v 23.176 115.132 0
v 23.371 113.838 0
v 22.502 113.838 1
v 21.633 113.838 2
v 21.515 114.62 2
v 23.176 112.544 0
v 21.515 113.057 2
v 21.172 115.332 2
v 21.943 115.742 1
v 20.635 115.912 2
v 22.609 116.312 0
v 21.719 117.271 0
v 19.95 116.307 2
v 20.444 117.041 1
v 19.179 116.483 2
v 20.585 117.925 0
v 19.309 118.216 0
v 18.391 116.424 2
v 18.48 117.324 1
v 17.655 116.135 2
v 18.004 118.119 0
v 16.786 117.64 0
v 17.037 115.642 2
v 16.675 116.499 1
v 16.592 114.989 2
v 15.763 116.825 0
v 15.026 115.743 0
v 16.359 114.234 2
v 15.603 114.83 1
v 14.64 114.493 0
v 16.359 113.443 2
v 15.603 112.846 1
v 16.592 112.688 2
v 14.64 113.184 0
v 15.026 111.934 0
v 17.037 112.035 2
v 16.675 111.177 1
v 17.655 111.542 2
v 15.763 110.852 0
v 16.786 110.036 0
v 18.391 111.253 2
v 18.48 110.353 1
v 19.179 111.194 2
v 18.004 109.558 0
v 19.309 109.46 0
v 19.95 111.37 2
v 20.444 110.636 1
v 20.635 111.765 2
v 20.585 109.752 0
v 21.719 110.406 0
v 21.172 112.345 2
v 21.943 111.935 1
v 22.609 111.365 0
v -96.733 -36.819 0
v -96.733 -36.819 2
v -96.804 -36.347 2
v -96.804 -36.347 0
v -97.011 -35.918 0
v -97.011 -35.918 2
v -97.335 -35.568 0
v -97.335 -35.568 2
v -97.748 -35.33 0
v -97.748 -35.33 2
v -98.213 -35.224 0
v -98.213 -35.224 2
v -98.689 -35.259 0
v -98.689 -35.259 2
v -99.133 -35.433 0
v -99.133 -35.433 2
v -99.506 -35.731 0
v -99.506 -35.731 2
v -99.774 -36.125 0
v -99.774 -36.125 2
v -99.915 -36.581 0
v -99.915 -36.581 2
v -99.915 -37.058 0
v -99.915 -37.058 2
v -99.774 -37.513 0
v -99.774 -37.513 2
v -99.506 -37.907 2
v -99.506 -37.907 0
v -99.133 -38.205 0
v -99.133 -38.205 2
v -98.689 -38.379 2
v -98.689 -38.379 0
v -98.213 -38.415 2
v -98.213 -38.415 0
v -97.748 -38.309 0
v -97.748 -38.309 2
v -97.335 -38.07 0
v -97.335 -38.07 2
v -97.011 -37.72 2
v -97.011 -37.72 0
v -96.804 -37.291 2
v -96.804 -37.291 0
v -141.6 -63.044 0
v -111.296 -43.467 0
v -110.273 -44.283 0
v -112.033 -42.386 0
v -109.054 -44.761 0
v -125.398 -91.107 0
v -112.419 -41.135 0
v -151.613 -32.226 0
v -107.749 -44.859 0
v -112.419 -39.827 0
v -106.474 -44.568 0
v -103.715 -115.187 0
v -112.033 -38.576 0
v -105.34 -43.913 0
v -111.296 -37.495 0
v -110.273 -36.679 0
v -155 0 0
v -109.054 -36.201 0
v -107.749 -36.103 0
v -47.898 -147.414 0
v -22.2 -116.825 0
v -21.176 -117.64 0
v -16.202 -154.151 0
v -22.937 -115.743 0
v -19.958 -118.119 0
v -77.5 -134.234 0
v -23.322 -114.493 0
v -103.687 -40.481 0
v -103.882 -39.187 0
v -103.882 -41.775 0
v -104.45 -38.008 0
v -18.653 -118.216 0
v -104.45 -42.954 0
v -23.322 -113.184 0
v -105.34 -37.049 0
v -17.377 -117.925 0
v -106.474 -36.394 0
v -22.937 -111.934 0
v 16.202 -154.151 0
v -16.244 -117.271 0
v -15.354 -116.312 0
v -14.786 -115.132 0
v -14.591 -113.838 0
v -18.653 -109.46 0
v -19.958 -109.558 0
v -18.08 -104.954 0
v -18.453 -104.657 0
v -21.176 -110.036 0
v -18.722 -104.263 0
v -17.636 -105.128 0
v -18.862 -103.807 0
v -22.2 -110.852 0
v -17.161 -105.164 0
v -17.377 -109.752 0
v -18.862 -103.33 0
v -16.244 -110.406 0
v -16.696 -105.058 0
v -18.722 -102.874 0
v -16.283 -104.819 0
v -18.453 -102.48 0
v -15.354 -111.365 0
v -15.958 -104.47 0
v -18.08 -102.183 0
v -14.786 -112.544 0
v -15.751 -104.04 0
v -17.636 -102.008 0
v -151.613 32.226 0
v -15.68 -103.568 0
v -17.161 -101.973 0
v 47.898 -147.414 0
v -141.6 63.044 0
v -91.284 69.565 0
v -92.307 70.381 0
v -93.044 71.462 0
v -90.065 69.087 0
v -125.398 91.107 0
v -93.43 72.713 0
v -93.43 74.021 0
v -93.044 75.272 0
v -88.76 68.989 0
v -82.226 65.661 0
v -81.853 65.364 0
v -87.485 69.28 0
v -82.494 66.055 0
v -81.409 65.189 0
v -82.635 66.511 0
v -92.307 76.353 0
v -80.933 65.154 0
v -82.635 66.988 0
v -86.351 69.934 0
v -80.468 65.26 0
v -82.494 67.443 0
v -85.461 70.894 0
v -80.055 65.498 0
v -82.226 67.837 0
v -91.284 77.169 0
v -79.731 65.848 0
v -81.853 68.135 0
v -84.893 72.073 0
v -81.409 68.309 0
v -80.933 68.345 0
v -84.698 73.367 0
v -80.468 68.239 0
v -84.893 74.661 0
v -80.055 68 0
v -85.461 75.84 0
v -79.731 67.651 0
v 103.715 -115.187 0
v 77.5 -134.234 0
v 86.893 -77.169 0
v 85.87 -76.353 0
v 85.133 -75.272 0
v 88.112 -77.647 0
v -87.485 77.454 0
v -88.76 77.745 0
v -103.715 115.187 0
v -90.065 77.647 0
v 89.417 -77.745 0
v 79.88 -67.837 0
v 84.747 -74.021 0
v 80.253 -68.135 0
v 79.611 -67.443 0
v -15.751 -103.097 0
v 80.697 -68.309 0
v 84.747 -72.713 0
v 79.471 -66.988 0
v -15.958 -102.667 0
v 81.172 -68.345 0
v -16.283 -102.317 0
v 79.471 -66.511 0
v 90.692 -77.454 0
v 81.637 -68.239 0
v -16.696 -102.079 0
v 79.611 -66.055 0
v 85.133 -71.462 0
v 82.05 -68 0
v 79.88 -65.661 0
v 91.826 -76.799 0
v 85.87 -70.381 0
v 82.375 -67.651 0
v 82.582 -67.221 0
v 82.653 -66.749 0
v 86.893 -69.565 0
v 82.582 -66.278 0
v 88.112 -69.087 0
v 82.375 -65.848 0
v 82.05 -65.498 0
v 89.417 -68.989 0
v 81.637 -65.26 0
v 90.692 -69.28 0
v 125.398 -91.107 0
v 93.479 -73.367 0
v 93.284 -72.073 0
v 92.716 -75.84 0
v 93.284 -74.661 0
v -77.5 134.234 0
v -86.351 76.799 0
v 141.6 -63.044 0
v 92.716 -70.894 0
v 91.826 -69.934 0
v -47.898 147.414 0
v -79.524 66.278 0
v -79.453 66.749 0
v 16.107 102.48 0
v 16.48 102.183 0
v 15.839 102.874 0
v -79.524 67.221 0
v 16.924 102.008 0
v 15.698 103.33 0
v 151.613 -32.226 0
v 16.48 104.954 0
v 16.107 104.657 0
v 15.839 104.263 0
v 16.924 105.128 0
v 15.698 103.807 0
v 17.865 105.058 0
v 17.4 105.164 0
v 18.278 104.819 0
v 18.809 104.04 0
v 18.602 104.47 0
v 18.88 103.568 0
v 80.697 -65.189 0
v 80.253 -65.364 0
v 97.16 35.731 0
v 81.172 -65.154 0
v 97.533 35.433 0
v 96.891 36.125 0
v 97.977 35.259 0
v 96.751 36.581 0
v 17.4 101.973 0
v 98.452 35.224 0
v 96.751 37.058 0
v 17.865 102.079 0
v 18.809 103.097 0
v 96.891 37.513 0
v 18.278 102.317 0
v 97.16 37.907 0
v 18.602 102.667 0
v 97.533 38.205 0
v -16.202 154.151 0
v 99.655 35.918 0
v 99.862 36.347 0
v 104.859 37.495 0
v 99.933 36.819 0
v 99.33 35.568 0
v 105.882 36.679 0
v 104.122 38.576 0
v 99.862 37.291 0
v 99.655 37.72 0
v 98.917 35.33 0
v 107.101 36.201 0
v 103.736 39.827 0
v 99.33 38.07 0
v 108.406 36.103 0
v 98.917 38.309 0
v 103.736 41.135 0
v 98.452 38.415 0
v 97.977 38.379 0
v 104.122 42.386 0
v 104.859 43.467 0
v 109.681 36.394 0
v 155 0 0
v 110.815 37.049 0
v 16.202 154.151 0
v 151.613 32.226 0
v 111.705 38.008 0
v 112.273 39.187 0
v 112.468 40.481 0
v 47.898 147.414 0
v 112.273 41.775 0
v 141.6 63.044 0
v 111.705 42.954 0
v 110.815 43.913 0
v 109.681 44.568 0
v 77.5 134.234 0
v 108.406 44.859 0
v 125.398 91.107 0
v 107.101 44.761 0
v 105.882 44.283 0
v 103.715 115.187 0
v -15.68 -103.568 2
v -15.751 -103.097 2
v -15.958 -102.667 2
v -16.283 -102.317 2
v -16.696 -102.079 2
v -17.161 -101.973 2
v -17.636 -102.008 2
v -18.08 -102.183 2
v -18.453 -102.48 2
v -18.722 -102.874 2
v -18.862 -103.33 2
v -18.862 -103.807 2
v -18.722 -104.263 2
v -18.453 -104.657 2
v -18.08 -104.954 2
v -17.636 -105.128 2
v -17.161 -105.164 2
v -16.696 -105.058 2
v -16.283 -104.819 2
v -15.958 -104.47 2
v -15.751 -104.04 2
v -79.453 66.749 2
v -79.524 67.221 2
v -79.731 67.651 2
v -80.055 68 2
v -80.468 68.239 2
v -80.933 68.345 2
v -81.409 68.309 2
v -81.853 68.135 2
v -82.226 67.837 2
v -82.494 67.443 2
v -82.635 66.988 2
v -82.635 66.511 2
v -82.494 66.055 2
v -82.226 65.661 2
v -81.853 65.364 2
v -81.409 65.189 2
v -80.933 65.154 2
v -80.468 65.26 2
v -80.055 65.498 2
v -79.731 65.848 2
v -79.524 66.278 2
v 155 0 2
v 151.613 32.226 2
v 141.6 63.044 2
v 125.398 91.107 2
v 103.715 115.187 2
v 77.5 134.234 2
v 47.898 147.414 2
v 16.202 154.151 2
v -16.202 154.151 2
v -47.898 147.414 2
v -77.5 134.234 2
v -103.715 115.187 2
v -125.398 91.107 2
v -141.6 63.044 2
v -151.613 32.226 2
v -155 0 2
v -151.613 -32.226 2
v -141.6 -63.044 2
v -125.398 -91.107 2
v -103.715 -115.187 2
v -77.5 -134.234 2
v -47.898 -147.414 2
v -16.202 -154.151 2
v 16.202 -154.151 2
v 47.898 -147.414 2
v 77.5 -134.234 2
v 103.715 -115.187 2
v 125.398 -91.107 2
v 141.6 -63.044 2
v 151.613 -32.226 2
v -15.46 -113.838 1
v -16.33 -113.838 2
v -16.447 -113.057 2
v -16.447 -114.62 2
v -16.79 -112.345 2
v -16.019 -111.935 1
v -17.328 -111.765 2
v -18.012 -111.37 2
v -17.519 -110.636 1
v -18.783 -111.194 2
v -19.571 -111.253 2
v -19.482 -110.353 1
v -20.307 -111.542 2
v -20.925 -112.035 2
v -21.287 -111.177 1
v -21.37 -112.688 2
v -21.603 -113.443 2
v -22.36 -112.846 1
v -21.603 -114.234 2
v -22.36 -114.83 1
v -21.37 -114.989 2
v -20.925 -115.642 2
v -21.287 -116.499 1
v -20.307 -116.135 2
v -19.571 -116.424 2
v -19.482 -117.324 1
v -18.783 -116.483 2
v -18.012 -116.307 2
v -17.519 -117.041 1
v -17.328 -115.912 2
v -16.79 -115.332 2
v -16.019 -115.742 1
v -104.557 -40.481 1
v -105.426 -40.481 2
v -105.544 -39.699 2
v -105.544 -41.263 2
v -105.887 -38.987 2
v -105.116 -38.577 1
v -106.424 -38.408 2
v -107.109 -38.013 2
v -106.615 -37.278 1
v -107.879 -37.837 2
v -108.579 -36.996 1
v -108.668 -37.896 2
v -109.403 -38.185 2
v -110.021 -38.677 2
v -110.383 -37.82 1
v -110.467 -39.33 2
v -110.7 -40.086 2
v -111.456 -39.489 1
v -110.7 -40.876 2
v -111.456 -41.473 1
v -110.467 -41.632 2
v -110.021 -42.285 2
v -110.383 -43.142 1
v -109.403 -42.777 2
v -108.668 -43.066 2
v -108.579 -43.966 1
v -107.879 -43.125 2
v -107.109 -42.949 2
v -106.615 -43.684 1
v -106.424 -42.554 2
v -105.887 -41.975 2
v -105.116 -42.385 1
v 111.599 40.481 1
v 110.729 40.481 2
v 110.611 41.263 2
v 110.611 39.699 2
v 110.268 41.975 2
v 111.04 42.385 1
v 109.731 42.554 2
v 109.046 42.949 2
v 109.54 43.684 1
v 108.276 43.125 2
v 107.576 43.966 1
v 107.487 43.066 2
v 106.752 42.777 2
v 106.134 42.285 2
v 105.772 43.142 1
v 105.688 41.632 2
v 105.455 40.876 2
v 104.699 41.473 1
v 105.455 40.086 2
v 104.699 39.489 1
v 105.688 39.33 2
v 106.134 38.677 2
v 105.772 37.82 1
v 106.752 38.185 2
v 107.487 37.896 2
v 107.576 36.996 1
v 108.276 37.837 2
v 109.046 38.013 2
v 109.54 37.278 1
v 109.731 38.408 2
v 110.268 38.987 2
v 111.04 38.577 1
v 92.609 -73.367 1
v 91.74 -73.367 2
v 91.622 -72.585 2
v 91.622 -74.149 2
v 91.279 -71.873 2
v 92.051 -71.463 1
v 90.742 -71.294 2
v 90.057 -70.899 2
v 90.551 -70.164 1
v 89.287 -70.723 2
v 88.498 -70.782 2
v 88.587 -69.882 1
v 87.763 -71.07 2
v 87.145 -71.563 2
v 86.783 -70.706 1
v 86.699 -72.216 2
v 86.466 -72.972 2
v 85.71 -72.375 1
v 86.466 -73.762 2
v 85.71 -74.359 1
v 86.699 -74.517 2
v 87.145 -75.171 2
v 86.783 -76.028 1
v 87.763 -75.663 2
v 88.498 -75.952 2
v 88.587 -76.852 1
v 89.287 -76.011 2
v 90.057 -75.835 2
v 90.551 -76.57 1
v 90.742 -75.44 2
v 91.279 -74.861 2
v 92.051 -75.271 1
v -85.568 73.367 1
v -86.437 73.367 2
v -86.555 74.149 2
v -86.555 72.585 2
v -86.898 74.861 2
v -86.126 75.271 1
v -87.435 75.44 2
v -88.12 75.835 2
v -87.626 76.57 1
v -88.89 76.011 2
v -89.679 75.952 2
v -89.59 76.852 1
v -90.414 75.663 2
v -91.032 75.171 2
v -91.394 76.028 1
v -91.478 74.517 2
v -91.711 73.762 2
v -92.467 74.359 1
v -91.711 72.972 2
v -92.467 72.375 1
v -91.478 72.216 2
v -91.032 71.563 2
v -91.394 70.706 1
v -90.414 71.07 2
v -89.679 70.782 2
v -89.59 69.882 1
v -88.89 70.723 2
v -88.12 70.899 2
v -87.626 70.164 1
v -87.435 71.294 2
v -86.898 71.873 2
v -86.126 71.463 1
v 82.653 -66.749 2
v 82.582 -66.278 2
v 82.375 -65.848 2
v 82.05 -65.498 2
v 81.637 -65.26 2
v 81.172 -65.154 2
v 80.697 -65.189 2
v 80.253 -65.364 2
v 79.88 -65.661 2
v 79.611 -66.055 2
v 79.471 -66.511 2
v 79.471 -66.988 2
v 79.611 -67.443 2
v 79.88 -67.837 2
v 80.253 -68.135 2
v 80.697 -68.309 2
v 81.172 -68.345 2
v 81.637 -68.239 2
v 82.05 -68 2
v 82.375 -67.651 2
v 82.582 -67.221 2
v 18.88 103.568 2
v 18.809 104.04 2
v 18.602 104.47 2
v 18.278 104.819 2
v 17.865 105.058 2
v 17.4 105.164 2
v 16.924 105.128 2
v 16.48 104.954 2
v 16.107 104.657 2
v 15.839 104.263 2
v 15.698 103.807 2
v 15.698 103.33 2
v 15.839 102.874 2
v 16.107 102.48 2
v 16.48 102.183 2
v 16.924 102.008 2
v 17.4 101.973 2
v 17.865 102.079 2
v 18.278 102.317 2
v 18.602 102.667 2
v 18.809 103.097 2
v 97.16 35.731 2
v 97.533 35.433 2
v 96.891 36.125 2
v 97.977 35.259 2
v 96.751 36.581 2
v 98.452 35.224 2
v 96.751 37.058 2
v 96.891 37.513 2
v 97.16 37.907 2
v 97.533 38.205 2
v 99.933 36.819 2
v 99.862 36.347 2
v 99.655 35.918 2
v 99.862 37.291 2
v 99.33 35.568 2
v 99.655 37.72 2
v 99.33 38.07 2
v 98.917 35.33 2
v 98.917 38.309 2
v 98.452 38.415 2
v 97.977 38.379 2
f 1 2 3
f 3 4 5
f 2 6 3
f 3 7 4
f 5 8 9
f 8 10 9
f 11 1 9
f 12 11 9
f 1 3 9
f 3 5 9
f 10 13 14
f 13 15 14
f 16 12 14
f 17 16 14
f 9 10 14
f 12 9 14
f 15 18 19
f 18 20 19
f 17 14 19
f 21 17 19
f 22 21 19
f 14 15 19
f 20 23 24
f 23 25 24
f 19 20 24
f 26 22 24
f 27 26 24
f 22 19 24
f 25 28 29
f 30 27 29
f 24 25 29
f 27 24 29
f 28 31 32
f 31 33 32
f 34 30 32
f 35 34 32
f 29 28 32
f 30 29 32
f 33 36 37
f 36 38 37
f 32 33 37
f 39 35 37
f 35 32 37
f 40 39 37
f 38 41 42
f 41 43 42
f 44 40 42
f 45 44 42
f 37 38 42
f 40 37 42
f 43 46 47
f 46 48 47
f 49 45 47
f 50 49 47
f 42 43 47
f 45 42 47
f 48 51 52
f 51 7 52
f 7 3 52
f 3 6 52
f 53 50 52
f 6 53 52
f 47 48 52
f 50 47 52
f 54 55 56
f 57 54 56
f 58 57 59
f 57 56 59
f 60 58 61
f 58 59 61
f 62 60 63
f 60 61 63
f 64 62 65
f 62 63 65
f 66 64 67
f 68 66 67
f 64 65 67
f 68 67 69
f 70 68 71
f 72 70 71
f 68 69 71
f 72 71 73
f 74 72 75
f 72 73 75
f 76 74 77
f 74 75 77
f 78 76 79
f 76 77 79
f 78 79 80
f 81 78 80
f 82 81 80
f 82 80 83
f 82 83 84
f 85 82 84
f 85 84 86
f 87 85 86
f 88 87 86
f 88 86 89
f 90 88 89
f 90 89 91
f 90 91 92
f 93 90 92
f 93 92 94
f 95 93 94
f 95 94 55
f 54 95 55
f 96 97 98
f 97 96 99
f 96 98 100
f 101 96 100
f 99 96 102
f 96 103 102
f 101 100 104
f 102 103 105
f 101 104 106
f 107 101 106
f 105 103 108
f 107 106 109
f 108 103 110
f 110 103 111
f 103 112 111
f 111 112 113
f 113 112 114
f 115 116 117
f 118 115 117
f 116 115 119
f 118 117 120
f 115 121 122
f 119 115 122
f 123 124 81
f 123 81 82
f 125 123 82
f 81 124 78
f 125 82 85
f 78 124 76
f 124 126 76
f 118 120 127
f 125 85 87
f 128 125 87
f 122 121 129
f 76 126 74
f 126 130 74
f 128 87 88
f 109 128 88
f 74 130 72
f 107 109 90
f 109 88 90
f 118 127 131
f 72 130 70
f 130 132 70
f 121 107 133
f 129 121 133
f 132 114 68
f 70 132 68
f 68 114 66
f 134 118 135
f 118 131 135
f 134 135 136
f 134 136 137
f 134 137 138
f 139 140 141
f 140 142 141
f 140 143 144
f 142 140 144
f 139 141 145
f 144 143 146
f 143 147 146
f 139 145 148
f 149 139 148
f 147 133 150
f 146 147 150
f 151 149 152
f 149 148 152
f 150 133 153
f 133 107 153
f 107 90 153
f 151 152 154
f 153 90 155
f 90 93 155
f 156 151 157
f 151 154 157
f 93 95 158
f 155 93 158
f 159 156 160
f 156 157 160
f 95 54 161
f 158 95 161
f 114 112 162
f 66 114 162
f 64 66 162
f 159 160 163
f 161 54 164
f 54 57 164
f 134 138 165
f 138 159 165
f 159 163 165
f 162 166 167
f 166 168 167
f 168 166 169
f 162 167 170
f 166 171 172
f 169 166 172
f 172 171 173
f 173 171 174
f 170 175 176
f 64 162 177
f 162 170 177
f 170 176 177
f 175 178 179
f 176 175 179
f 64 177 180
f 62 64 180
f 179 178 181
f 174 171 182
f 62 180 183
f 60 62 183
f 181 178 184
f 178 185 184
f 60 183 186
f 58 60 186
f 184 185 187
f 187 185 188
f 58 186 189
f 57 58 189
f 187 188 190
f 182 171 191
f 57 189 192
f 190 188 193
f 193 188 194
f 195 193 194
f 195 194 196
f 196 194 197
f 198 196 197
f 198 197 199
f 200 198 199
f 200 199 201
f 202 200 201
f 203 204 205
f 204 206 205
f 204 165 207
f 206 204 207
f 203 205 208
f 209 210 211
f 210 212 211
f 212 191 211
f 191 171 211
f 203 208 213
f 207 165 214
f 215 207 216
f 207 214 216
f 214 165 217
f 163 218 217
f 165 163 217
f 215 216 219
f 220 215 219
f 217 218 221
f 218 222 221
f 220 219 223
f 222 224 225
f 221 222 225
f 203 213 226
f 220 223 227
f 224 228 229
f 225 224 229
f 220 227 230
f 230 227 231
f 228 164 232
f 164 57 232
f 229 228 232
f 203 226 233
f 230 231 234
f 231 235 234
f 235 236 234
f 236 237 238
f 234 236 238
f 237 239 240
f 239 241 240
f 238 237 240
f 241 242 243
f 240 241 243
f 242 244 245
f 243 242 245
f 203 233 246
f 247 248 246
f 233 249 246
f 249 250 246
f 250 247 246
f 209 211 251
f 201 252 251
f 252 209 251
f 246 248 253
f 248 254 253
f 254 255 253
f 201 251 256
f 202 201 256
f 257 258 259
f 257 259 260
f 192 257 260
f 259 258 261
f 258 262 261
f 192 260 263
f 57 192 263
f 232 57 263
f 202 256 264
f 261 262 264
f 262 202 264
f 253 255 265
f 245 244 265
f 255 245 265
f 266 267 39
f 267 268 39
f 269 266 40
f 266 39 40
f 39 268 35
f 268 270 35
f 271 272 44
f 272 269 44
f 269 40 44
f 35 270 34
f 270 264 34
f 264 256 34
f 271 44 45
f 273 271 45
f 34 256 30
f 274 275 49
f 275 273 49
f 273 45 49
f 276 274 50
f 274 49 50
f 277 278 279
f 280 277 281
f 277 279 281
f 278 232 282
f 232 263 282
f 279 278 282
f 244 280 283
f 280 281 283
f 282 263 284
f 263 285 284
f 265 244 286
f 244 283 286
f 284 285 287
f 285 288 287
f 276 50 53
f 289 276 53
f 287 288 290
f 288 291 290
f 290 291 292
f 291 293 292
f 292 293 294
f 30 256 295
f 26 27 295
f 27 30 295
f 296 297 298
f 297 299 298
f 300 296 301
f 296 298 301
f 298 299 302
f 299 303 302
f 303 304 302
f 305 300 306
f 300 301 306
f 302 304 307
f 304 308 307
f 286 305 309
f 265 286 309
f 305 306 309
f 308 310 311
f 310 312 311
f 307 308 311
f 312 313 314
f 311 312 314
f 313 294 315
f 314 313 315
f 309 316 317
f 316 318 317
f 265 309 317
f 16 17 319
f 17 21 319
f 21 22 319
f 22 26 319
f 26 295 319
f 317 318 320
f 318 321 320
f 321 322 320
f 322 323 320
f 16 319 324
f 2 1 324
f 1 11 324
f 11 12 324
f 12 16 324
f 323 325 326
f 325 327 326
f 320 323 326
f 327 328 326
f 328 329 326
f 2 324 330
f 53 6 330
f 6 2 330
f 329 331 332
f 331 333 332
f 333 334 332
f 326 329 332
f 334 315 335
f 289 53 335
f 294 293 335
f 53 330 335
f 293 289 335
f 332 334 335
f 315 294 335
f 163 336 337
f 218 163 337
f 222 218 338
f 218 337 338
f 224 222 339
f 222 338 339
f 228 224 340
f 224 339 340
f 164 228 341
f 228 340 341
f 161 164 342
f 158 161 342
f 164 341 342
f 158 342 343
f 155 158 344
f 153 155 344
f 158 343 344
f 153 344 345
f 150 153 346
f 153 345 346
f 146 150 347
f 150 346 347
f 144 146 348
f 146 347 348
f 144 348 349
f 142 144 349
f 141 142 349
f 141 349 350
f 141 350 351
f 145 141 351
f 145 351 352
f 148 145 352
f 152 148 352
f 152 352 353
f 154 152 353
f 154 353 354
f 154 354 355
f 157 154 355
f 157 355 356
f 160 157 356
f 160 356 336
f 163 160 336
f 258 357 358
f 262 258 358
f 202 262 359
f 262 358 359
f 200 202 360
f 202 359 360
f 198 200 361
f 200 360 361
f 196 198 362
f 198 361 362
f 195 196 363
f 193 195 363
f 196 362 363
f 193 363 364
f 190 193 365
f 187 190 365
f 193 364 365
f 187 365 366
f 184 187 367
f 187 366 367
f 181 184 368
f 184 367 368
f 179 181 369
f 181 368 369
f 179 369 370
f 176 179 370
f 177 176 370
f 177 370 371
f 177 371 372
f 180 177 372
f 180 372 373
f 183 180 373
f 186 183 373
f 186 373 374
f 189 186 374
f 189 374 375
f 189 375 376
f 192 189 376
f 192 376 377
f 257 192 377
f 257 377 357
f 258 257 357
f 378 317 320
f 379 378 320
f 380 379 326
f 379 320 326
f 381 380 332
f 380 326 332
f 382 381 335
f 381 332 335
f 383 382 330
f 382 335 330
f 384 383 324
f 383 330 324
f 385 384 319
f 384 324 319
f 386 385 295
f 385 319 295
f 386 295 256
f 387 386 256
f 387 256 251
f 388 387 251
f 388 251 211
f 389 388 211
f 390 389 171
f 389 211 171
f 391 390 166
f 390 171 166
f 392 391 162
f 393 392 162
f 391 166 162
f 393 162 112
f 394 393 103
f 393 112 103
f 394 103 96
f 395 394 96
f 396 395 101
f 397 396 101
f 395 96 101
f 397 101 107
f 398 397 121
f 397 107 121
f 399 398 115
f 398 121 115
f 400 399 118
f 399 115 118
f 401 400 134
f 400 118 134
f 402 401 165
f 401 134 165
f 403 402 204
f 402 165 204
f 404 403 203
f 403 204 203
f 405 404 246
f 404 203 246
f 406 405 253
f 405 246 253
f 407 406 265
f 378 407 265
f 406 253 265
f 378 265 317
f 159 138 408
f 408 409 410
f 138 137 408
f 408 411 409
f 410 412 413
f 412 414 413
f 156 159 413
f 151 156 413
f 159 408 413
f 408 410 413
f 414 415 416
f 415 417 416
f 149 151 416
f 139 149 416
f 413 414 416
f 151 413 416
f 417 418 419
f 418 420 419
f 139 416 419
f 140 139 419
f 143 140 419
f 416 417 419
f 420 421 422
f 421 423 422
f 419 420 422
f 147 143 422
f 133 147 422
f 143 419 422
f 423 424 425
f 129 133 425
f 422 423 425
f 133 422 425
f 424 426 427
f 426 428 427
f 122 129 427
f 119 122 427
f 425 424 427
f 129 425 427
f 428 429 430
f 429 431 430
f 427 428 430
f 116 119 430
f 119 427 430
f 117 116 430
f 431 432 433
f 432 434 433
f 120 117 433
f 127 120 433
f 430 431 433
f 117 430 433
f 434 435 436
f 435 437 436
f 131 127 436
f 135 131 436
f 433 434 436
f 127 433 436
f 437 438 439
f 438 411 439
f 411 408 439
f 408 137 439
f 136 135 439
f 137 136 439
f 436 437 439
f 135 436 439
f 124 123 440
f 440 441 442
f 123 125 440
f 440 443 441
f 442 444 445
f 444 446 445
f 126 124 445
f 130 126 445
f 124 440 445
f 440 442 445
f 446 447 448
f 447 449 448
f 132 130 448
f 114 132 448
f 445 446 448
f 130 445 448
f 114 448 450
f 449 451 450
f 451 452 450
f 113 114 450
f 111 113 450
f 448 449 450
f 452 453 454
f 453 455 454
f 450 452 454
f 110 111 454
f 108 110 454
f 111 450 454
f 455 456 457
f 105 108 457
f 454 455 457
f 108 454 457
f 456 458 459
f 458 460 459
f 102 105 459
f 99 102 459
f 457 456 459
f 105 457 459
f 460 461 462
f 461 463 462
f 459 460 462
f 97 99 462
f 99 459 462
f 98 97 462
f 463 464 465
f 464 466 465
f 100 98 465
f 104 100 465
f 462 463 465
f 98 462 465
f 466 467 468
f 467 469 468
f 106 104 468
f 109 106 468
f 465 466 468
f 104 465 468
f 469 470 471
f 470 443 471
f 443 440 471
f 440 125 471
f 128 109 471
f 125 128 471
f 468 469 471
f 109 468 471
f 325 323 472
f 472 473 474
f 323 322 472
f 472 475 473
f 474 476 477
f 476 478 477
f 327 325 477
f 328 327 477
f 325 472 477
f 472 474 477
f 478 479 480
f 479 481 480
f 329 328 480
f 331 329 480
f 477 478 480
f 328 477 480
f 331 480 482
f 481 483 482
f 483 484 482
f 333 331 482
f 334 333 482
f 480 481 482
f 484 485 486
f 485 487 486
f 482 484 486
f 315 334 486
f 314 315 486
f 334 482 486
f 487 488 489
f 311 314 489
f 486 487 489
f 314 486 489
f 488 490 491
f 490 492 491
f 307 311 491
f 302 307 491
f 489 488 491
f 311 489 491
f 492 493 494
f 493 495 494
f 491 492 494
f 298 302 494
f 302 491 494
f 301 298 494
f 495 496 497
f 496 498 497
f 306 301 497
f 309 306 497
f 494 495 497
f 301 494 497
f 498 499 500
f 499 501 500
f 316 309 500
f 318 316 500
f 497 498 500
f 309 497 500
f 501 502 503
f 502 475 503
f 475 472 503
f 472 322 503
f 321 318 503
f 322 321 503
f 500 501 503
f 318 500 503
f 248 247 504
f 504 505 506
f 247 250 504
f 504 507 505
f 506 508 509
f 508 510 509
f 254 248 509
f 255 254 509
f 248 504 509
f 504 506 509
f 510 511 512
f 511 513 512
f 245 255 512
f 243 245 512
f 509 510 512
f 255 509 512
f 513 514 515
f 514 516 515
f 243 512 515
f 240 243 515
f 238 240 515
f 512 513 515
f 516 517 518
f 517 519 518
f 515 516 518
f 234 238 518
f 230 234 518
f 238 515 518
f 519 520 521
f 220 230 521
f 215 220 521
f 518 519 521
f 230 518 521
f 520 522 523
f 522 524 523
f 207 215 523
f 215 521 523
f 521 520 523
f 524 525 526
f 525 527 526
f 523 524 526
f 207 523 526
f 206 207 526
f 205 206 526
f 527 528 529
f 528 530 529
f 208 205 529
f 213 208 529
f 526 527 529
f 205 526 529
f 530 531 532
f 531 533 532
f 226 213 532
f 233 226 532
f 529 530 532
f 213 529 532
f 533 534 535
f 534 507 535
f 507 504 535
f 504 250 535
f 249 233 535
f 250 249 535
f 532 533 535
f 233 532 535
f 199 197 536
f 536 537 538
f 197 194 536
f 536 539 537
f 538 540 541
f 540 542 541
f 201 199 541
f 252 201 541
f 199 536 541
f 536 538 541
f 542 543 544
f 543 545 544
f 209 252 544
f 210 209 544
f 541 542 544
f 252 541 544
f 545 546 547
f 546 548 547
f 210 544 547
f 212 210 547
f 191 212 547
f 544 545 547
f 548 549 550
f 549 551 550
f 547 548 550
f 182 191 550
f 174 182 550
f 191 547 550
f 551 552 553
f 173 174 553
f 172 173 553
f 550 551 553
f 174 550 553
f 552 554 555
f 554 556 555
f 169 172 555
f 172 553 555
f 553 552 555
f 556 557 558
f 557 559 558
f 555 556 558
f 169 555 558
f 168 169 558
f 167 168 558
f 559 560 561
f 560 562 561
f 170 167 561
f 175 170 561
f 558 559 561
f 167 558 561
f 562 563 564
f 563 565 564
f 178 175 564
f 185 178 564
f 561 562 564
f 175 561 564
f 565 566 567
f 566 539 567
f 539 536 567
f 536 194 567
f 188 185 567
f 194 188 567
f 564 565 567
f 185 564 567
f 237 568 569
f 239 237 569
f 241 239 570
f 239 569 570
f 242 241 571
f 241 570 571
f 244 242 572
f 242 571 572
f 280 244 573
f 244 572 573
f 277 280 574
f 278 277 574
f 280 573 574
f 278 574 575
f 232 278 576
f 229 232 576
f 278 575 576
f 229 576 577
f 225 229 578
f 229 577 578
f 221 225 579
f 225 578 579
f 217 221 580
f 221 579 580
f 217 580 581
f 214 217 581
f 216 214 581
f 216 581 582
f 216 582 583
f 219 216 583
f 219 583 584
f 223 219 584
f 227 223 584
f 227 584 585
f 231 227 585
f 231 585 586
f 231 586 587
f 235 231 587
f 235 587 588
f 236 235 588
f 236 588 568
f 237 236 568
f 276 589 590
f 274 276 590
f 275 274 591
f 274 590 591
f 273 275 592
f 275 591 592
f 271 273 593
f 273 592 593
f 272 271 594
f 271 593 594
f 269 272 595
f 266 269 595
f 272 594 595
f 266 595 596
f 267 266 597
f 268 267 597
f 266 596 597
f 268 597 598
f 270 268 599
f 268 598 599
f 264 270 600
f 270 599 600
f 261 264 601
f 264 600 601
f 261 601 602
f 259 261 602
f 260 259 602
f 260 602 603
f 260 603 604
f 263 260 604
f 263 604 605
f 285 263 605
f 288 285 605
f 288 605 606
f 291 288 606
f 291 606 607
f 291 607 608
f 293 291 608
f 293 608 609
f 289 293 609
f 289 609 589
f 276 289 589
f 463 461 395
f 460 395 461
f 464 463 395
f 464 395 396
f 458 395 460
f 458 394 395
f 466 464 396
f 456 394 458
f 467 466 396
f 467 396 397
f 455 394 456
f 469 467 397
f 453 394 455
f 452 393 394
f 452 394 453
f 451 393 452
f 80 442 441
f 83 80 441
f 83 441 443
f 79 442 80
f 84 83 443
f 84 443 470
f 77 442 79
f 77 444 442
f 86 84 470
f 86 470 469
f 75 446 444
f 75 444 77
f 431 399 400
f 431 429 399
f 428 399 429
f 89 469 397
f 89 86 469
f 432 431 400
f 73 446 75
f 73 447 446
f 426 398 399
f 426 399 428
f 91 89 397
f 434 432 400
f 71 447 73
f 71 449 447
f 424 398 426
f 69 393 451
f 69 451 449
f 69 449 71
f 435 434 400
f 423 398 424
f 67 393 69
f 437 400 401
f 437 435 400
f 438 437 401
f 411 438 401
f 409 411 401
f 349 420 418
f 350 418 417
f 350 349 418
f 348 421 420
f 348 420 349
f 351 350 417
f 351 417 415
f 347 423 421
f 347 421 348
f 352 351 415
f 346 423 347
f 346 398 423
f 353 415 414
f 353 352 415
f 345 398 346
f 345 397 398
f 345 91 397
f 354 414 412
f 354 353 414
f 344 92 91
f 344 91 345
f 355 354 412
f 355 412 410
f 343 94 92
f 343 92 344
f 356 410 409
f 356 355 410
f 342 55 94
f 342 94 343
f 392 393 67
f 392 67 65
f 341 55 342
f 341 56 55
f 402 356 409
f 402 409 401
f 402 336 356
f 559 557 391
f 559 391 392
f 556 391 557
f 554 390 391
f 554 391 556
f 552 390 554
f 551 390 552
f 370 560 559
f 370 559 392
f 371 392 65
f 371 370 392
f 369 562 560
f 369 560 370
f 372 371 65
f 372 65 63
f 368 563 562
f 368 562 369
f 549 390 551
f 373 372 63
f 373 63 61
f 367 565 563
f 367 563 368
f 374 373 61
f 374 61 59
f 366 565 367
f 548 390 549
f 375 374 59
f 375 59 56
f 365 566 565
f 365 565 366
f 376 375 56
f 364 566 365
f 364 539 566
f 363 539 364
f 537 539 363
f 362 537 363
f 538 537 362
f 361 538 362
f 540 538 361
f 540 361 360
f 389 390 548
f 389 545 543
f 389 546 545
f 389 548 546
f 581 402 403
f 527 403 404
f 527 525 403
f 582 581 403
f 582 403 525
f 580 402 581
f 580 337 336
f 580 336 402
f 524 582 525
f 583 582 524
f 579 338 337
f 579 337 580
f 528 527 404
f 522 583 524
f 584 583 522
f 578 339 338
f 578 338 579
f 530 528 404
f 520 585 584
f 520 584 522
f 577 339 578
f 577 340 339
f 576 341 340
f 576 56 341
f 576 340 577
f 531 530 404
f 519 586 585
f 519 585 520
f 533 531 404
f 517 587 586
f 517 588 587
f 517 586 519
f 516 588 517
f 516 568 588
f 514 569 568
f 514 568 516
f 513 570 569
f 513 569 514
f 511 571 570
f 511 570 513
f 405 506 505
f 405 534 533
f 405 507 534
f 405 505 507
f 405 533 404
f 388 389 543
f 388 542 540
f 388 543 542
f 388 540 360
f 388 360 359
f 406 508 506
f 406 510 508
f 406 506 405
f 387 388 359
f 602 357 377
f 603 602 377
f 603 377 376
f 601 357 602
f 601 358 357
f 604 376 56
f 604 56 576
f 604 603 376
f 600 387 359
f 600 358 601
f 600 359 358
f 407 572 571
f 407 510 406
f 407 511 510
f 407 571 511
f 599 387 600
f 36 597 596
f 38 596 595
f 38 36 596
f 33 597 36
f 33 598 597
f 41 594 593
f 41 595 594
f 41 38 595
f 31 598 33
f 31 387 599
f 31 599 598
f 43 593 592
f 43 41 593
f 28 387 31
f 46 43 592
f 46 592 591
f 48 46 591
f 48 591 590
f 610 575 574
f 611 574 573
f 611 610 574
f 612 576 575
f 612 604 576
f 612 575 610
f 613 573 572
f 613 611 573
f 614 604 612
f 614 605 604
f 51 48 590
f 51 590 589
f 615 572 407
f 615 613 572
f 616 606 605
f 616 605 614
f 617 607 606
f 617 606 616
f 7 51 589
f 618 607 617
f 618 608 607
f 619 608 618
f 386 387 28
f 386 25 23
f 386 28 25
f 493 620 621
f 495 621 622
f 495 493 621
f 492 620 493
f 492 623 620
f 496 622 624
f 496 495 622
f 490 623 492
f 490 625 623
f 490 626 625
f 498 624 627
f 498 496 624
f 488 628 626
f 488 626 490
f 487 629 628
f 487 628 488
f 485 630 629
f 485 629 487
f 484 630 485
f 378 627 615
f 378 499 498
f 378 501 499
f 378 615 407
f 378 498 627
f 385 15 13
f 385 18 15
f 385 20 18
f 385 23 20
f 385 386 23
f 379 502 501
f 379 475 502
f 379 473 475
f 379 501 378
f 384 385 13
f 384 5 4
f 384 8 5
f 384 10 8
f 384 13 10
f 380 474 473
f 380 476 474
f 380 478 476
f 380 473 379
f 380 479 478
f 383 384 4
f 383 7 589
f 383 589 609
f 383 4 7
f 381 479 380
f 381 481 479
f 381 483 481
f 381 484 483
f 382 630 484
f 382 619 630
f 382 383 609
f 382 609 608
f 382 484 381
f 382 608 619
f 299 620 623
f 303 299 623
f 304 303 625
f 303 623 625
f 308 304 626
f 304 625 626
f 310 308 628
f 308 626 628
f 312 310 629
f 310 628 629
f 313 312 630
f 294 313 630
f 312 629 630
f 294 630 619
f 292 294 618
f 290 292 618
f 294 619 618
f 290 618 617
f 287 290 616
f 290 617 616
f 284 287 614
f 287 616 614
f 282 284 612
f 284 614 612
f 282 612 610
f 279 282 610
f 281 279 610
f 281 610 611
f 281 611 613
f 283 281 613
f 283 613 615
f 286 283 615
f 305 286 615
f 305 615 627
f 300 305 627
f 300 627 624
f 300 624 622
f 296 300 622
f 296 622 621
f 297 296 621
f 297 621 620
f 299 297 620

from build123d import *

# Parameters (mm, degrees)
SKETCH1_R                                         = 155
BOSS_EXTRUDE1_DEPTH                               = 2
SKETCH3_R                                         = 1.6
CUT_EXTRUDE2_DEPTH                                = 10
CSK_FOR_8_FLAT_HEAD_MACHINE_SCREW_100_D           = 4.4958
CSK_FOR_8_FLAT_HEAD_MACHINE_SCREW_100_DEPTH       = 10.71
CSK_FOR_8_FLAT_HEAD_MACHINE_SCREW_100_CSINK_D     = 8.780526
CSK_FOR_8_FLAT_HEAD_MACHINE_SCREW_100_CSINK_ANGLE = 82
CSK_FOR_8_FLAT_HEAD_MACHINE_SCREW_100_TIP         = 1.350674586


with BuildPart() as part:
    # Sketch1 → Boss-Extrude1 (new body)
    with BuildSketch(Plane.XY):
        Circle(SKETCH1_R)
    extrude(amount=BOSS_EXTRUDE1_DEPTH)

    # Sketch3 → Cut-Extrude2 (cut)
    with BuildSketch(Plane.XY.offset(2)):
        with Locations((17.280155357, 103.568316733)):
            Circle(SKETCH3_R)
        with Locations((-81.052715639, 66.749211887)):
            Circle(SKETCH3_R)
        with Locations((-98.332870996, -36.819104846)):
            Circle(SKETCH3_R)
        with Locations((-17.280155357, -103.568316733)):
            Circle(SKETCH3_R)
        with Locations((81.052715639, -66.749211887)):
            Circle(SKETCH3_R)
        with Locations((98.332870996, 36.819104846)):
            Circle(SKETCH3_R)
    extrude(amount=-CUT_EXTRUDE2_DEPTH, mode=Mode.SUBTRACT)

    # CSK for #8 Flat Head Machine Screw (100)1
    with Locations(Plane(origin=(0, 0, 0), x_dir=(-1, 0, 0), z_dir=(0, 0, -1))):
        with Locations((-18.981218556, 113.83840056), (89.088513447, 73.366919465), (108.077556089, -40.480982816), (-108.077556089, 40.480982816), (-89.088513447, -73.366919465), (18.981218556, -113.83840056)):
            CounterSinkHole(CSK_FOR_8_FLAT_HEAD_MACHINE_SCREW_100_D / 2, CSK_FOR_8_FLAT_HEAD_MACHINE_SCREW_100_CSINK_D / 2, depth=CSK_FOR_8_FLAT_HEAD_MACHINE_SCREW_100_DEPTH, counter_sink_angle=CSK_FOR_8_FLAT_HEAD_MACHINE_SCREW_100_CSINK_ANGLE)
            with Locations((0, 0, -(CSK_FOR_8_FLAT_HEAD_MACHINE_SCREW_100_DEPTH + CSK_FOR_8_FLAT_HEAD_MACHINE_SCREW_100_TIP / 2))):  # 118° drill point
                Cone(0, CSK_FOR_8_FLAT_HEAD_MACHINE_SCREW_100_D / 2, CSK_FOR_8_FLAT_HEAD_MACHINE_SCREW_100_TIP, mode=Mode.SUBTRACT)


solid = part.part
